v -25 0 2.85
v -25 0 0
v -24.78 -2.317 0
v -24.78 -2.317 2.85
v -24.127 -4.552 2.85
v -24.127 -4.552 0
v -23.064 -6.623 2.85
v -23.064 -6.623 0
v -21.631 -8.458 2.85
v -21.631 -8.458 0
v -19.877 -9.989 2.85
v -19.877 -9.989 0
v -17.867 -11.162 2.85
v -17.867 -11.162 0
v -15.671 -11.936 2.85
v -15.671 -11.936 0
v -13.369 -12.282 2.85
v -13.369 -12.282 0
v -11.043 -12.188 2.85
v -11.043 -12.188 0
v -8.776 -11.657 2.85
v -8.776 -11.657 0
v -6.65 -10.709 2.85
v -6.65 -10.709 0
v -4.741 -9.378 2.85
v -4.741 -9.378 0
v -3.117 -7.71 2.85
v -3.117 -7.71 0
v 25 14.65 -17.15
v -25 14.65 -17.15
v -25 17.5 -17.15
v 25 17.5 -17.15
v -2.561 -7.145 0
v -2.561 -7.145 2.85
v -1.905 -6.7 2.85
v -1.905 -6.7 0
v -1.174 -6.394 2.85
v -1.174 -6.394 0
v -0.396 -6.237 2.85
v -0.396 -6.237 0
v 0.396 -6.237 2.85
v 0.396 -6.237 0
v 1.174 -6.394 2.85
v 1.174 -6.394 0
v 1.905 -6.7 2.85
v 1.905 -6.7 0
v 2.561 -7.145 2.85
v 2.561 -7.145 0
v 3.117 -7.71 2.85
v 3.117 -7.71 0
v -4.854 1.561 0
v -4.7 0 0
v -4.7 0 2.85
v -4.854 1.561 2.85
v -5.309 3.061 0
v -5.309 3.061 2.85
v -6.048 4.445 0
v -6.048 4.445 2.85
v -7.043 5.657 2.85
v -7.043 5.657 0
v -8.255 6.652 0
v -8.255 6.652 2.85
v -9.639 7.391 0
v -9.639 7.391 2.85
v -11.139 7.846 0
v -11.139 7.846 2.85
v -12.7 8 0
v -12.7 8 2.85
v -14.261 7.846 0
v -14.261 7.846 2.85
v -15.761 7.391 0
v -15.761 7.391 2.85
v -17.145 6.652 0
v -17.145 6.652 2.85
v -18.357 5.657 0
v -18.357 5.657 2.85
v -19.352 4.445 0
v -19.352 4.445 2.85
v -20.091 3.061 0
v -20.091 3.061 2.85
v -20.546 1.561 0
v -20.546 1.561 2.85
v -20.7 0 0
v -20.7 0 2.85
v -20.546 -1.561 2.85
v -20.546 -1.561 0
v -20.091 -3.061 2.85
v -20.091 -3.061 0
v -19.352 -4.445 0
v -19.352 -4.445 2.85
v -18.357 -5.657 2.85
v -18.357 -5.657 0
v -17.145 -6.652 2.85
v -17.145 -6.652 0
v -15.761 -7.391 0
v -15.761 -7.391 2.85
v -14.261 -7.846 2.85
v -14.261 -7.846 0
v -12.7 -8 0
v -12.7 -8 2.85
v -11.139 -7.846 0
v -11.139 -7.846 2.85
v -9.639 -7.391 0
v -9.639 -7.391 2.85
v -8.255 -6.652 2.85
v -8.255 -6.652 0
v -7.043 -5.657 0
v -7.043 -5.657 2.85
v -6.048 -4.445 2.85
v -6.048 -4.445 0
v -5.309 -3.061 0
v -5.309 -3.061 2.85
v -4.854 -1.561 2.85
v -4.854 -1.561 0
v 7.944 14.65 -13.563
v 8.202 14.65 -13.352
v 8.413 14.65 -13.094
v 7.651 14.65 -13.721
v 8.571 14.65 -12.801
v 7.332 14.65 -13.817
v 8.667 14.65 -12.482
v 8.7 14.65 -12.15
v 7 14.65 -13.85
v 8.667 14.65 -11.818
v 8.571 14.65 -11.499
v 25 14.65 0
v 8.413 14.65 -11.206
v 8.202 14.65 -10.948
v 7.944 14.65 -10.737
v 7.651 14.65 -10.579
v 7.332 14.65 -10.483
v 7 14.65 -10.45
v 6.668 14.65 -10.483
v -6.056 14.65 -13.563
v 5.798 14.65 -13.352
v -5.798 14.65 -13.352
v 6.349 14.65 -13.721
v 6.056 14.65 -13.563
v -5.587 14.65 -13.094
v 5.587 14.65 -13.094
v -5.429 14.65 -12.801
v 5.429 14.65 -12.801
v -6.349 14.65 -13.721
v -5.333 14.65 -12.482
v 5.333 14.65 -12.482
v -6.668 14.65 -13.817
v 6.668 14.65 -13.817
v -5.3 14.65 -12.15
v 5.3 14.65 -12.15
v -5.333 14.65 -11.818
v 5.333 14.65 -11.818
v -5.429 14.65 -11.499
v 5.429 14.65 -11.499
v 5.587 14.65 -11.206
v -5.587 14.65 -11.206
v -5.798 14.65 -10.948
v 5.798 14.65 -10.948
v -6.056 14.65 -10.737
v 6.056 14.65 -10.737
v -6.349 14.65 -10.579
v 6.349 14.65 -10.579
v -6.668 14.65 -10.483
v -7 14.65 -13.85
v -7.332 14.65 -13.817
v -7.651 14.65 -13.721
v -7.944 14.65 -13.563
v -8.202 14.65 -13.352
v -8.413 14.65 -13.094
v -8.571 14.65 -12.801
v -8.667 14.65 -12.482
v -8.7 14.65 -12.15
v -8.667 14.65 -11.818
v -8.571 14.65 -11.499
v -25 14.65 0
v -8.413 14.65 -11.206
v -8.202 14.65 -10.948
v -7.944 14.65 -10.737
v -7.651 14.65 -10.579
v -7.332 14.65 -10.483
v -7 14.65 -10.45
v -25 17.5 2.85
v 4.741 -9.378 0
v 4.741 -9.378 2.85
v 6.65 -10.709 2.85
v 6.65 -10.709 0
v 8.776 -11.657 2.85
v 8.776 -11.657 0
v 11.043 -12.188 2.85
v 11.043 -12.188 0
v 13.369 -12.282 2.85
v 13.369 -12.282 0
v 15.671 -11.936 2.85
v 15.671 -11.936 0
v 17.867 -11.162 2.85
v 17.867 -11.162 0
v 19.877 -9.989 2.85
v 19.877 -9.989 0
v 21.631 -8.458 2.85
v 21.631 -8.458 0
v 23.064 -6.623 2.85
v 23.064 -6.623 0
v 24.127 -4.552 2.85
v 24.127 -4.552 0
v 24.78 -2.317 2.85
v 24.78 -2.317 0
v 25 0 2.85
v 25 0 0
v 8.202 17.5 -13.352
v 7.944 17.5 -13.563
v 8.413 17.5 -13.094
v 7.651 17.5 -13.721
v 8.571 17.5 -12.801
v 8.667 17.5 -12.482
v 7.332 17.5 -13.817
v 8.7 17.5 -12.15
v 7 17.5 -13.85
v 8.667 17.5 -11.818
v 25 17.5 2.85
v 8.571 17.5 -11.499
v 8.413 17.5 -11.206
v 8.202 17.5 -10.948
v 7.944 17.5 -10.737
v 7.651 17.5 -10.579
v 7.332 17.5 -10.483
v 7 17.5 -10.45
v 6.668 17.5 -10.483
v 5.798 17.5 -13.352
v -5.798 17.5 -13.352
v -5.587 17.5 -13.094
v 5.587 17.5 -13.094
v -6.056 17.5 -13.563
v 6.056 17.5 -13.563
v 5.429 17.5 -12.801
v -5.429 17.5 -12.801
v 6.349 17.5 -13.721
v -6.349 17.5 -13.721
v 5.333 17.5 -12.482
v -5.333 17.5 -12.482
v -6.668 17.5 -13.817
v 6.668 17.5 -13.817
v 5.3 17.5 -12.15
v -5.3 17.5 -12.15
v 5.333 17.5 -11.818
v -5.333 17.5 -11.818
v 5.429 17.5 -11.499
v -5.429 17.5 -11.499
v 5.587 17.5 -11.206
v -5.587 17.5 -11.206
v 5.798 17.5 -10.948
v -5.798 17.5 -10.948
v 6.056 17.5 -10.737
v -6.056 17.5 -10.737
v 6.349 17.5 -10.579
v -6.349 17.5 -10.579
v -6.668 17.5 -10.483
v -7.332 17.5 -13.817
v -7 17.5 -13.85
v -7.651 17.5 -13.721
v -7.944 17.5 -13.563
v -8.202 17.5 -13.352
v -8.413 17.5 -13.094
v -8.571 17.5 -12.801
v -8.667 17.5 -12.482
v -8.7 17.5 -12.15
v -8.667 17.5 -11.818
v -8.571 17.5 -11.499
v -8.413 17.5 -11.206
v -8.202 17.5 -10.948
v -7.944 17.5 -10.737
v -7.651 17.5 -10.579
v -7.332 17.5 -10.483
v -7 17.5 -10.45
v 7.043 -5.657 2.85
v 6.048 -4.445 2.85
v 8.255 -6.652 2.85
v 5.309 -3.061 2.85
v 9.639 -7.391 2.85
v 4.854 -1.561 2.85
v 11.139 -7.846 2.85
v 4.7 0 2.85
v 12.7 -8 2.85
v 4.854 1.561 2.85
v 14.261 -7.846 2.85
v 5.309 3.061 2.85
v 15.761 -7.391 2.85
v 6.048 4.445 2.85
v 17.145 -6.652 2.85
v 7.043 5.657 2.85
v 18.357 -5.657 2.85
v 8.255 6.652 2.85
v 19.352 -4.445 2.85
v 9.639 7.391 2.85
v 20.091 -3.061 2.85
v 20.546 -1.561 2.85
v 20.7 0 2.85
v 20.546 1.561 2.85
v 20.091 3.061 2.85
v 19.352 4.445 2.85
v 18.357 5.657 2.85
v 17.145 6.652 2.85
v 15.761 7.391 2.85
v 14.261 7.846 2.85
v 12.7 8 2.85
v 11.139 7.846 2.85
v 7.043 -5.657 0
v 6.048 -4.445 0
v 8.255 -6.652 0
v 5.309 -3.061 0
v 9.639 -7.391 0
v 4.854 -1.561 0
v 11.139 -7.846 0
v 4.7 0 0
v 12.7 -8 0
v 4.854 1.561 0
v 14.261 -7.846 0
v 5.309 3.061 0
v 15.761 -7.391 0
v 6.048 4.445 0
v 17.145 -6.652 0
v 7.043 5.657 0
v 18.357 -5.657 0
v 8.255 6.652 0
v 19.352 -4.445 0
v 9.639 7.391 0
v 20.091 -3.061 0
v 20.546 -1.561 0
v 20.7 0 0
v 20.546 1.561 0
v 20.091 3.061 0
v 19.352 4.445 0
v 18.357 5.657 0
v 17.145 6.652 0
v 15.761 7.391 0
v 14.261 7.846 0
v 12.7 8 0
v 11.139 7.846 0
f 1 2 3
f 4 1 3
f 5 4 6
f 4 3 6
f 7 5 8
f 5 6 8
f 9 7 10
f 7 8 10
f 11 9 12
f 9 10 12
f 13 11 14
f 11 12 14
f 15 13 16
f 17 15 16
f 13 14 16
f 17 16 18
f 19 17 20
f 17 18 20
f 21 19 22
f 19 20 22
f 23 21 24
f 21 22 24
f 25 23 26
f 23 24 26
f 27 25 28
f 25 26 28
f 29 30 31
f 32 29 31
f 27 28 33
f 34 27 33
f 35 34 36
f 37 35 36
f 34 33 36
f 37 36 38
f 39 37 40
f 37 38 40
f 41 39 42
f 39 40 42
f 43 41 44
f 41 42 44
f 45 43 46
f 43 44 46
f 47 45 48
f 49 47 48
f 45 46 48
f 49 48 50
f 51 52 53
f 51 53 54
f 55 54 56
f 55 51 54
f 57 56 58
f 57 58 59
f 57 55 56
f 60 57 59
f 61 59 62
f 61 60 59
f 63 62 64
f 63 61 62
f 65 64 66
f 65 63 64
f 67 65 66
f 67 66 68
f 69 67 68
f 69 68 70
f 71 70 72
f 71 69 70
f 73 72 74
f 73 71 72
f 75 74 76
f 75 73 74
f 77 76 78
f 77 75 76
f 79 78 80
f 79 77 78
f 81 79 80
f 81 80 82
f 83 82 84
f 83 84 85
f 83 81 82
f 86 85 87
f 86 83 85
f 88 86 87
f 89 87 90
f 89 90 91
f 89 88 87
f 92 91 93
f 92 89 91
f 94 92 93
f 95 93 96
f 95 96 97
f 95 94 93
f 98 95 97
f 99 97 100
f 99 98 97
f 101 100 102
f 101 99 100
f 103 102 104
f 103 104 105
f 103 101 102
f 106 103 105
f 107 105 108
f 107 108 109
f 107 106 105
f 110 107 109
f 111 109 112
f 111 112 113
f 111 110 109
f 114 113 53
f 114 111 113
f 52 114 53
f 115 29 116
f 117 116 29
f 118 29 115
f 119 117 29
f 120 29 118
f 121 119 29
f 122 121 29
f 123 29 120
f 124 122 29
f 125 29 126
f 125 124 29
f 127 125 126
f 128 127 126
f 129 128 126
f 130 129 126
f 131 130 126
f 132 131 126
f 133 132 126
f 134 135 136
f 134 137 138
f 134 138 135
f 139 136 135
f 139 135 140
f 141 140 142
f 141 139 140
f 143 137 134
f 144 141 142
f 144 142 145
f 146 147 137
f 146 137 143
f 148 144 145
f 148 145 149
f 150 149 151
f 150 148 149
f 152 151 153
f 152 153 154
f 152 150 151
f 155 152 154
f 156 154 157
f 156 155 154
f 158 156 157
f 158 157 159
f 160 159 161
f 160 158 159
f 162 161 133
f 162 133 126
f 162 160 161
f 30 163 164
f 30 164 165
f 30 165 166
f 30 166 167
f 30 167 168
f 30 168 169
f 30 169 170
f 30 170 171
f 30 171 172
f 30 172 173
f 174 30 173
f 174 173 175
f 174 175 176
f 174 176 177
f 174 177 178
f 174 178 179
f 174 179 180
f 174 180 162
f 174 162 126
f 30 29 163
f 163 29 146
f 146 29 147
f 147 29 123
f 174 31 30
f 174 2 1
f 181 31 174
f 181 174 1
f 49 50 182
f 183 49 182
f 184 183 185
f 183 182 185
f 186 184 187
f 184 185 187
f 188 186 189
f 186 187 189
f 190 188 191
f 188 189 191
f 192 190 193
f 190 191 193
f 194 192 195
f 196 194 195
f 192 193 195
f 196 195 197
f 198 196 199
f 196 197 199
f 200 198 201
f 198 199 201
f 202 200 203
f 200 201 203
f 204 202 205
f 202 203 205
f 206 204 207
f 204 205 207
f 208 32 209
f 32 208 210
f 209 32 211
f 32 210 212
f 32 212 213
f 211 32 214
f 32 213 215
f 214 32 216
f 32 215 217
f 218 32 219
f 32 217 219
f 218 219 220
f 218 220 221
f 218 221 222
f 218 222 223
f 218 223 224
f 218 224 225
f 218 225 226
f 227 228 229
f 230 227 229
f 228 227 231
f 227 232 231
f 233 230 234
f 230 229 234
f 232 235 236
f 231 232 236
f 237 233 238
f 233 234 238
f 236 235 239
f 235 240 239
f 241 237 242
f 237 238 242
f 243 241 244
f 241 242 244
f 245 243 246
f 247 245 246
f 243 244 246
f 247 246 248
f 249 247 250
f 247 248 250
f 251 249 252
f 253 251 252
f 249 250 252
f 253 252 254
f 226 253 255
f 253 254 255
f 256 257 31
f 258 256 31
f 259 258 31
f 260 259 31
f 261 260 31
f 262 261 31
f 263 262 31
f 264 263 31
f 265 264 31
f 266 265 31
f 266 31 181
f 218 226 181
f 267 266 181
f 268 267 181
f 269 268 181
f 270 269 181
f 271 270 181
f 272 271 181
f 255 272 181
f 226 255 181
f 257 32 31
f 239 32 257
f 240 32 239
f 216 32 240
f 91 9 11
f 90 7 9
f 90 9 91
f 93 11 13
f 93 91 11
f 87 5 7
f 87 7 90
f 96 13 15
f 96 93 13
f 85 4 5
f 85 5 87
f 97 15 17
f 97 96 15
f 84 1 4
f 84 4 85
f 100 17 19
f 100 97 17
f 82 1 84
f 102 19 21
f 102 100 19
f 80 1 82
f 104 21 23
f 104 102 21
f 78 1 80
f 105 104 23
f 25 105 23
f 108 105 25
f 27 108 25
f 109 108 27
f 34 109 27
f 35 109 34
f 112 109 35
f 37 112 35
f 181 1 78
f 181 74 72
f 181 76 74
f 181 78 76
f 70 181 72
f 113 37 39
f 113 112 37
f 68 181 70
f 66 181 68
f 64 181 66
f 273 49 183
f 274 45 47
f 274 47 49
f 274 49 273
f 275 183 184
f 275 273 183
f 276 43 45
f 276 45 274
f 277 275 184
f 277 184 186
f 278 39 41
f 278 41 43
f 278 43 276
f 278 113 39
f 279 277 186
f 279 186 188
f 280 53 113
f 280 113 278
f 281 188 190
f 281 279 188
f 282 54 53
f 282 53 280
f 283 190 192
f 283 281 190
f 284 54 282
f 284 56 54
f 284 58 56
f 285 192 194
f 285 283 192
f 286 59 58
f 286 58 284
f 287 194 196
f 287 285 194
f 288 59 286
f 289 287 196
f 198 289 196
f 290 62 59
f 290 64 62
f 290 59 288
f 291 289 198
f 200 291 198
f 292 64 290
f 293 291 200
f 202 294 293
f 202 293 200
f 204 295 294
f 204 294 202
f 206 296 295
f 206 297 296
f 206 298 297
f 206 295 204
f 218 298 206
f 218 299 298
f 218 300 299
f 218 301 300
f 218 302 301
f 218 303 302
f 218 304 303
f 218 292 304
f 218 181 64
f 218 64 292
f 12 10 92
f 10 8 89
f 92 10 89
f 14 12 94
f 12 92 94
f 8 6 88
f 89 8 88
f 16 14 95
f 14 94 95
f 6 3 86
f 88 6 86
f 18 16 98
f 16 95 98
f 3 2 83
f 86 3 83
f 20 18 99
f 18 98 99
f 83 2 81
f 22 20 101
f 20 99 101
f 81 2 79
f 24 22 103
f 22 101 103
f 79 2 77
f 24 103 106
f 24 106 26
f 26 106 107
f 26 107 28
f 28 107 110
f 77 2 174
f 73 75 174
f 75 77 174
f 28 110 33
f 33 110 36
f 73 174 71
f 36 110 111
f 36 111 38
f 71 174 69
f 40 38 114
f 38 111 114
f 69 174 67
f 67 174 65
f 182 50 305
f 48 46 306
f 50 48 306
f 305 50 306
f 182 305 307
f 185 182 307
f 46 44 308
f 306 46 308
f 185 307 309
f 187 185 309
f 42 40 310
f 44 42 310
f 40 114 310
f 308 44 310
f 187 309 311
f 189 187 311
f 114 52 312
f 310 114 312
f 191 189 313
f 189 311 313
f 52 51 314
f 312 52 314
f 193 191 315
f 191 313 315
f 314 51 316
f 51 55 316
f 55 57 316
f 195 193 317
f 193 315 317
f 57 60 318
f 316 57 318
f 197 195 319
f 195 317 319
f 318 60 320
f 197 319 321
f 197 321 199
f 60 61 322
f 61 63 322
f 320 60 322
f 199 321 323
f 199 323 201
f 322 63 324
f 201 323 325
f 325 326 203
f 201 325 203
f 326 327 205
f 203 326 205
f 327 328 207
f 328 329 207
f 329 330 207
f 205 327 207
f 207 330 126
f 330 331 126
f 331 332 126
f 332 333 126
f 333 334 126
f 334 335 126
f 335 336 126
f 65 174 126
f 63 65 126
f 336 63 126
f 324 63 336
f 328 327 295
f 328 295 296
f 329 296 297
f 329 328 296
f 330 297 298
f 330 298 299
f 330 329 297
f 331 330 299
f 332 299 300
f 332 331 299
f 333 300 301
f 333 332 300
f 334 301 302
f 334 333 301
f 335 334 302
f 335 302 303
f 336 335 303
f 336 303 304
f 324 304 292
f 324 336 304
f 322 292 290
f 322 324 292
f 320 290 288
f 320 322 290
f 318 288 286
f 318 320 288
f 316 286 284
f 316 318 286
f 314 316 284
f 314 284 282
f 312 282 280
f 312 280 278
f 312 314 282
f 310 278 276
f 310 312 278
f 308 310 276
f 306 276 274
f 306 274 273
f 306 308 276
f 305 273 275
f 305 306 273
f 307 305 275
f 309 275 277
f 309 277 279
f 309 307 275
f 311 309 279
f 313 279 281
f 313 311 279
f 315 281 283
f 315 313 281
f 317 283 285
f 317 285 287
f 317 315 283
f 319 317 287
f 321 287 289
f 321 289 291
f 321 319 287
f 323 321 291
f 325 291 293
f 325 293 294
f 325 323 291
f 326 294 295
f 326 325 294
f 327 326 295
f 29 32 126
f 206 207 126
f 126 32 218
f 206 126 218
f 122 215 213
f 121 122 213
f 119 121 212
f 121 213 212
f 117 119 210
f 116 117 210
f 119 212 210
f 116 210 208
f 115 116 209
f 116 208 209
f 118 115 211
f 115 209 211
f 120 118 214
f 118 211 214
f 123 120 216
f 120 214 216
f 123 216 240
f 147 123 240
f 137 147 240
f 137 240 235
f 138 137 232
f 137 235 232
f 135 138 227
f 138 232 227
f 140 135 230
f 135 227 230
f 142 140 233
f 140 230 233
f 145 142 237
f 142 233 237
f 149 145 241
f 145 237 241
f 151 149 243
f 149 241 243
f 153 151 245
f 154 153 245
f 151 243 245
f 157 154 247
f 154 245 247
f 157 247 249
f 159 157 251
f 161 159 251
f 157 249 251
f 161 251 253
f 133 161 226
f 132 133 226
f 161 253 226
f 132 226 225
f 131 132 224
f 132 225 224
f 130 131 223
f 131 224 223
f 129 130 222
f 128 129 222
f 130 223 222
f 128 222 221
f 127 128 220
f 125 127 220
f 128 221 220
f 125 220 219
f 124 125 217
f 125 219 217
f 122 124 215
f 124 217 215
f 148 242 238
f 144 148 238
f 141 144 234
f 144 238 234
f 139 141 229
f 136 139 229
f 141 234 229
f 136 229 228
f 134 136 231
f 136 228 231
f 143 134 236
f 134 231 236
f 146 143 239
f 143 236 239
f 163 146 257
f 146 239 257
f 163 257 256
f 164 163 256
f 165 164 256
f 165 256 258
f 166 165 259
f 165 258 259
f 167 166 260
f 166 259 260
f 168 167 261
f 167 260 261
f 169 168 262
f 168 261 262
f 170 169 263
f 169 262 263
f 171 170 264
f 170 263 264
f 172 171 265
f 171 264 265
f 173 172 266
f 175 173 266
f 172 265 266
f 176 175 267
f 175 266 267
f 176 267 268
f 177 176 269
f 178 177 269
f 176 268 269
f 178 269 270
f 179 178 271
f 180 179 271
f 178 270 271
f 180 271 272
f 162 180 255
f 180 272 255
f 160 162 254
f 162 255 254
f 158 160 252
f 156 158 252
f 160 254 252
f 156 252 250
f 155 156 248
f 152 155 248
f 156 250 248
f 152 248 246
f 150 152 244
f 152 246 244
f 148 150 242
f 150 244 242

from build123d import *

# Parameters (mm, degrees)
SKETCH2_R           = 8
BOSS_EXTRUDE1_DEPTH = 2.85
SKETCH3_W           = 17.15
SKETCH3_H           = 2.85
BOSS_EXTRUDE2_DEPTH = 50
SKETCH4_R           = 1.7
CUT_EXTRUDE1_DEPTH  = 2.85


with BuildPart() as part:
    # Sketch2 → Boss-Extrude1 (new body)
    with BuildSketch(Plane.XY):
        with BuildLine():
            Line((-25, 17.5), (-25, 0))
            ThreePointArc((-25, 0), (-16.787403964, -11.60099689), (-3.116564417, -7.710237508))
            ThreePointArc((-3.116564417, -7.710237508), (0, -6.21763182), (3.116564417, -7.710237508))
            ThreePointArc((3.116564417, -7.710237508), (16.787403964, -11.60099689), (25, 0))
            Line((25, 0), (25, 17.5))
            Line((25, 17.5), (-25, 17.5))
        make_face()
        with Locations((12.7, 0)):
            Circle(SKETCH2_R, mode=Mode.SUBTRACT)
        with Locations((-12.7, 0)):
            Circle(SKETCH2_R, mode=Mode.SUBTRACT)
    extrude(amount=BOSS_EXTRUDE1_DEPTH)

    # Sketch3 → Boss-Extrude2 (add)
    with BuildSketch(Plane.ZY.offset(25)):
        with Locations((-8.575, 16.075)):
            Rectangle(SKETCH3_W, SKETCH3_H)
    extrude(amount=-BOSS_EXTRUDE2_DEPTH)

    # Sketch4 → Cut-Extrude1 (cut)
    with BuildSketch(Plane(origin=(0, 17.5, 0), x_dir=(1, 0, 0), z_dir=(0, 1, 0))):
        with Locations((-7, 12.15)):
            Circle(SKETCH4_R)
        with Locations((7, 12.15)):
            Circle(SKETCH4_R)
    extrude(amount=-CUT_EXTRUDE1_DEPTH, mode=Mode.SUBTRACT)


solid = part.part
